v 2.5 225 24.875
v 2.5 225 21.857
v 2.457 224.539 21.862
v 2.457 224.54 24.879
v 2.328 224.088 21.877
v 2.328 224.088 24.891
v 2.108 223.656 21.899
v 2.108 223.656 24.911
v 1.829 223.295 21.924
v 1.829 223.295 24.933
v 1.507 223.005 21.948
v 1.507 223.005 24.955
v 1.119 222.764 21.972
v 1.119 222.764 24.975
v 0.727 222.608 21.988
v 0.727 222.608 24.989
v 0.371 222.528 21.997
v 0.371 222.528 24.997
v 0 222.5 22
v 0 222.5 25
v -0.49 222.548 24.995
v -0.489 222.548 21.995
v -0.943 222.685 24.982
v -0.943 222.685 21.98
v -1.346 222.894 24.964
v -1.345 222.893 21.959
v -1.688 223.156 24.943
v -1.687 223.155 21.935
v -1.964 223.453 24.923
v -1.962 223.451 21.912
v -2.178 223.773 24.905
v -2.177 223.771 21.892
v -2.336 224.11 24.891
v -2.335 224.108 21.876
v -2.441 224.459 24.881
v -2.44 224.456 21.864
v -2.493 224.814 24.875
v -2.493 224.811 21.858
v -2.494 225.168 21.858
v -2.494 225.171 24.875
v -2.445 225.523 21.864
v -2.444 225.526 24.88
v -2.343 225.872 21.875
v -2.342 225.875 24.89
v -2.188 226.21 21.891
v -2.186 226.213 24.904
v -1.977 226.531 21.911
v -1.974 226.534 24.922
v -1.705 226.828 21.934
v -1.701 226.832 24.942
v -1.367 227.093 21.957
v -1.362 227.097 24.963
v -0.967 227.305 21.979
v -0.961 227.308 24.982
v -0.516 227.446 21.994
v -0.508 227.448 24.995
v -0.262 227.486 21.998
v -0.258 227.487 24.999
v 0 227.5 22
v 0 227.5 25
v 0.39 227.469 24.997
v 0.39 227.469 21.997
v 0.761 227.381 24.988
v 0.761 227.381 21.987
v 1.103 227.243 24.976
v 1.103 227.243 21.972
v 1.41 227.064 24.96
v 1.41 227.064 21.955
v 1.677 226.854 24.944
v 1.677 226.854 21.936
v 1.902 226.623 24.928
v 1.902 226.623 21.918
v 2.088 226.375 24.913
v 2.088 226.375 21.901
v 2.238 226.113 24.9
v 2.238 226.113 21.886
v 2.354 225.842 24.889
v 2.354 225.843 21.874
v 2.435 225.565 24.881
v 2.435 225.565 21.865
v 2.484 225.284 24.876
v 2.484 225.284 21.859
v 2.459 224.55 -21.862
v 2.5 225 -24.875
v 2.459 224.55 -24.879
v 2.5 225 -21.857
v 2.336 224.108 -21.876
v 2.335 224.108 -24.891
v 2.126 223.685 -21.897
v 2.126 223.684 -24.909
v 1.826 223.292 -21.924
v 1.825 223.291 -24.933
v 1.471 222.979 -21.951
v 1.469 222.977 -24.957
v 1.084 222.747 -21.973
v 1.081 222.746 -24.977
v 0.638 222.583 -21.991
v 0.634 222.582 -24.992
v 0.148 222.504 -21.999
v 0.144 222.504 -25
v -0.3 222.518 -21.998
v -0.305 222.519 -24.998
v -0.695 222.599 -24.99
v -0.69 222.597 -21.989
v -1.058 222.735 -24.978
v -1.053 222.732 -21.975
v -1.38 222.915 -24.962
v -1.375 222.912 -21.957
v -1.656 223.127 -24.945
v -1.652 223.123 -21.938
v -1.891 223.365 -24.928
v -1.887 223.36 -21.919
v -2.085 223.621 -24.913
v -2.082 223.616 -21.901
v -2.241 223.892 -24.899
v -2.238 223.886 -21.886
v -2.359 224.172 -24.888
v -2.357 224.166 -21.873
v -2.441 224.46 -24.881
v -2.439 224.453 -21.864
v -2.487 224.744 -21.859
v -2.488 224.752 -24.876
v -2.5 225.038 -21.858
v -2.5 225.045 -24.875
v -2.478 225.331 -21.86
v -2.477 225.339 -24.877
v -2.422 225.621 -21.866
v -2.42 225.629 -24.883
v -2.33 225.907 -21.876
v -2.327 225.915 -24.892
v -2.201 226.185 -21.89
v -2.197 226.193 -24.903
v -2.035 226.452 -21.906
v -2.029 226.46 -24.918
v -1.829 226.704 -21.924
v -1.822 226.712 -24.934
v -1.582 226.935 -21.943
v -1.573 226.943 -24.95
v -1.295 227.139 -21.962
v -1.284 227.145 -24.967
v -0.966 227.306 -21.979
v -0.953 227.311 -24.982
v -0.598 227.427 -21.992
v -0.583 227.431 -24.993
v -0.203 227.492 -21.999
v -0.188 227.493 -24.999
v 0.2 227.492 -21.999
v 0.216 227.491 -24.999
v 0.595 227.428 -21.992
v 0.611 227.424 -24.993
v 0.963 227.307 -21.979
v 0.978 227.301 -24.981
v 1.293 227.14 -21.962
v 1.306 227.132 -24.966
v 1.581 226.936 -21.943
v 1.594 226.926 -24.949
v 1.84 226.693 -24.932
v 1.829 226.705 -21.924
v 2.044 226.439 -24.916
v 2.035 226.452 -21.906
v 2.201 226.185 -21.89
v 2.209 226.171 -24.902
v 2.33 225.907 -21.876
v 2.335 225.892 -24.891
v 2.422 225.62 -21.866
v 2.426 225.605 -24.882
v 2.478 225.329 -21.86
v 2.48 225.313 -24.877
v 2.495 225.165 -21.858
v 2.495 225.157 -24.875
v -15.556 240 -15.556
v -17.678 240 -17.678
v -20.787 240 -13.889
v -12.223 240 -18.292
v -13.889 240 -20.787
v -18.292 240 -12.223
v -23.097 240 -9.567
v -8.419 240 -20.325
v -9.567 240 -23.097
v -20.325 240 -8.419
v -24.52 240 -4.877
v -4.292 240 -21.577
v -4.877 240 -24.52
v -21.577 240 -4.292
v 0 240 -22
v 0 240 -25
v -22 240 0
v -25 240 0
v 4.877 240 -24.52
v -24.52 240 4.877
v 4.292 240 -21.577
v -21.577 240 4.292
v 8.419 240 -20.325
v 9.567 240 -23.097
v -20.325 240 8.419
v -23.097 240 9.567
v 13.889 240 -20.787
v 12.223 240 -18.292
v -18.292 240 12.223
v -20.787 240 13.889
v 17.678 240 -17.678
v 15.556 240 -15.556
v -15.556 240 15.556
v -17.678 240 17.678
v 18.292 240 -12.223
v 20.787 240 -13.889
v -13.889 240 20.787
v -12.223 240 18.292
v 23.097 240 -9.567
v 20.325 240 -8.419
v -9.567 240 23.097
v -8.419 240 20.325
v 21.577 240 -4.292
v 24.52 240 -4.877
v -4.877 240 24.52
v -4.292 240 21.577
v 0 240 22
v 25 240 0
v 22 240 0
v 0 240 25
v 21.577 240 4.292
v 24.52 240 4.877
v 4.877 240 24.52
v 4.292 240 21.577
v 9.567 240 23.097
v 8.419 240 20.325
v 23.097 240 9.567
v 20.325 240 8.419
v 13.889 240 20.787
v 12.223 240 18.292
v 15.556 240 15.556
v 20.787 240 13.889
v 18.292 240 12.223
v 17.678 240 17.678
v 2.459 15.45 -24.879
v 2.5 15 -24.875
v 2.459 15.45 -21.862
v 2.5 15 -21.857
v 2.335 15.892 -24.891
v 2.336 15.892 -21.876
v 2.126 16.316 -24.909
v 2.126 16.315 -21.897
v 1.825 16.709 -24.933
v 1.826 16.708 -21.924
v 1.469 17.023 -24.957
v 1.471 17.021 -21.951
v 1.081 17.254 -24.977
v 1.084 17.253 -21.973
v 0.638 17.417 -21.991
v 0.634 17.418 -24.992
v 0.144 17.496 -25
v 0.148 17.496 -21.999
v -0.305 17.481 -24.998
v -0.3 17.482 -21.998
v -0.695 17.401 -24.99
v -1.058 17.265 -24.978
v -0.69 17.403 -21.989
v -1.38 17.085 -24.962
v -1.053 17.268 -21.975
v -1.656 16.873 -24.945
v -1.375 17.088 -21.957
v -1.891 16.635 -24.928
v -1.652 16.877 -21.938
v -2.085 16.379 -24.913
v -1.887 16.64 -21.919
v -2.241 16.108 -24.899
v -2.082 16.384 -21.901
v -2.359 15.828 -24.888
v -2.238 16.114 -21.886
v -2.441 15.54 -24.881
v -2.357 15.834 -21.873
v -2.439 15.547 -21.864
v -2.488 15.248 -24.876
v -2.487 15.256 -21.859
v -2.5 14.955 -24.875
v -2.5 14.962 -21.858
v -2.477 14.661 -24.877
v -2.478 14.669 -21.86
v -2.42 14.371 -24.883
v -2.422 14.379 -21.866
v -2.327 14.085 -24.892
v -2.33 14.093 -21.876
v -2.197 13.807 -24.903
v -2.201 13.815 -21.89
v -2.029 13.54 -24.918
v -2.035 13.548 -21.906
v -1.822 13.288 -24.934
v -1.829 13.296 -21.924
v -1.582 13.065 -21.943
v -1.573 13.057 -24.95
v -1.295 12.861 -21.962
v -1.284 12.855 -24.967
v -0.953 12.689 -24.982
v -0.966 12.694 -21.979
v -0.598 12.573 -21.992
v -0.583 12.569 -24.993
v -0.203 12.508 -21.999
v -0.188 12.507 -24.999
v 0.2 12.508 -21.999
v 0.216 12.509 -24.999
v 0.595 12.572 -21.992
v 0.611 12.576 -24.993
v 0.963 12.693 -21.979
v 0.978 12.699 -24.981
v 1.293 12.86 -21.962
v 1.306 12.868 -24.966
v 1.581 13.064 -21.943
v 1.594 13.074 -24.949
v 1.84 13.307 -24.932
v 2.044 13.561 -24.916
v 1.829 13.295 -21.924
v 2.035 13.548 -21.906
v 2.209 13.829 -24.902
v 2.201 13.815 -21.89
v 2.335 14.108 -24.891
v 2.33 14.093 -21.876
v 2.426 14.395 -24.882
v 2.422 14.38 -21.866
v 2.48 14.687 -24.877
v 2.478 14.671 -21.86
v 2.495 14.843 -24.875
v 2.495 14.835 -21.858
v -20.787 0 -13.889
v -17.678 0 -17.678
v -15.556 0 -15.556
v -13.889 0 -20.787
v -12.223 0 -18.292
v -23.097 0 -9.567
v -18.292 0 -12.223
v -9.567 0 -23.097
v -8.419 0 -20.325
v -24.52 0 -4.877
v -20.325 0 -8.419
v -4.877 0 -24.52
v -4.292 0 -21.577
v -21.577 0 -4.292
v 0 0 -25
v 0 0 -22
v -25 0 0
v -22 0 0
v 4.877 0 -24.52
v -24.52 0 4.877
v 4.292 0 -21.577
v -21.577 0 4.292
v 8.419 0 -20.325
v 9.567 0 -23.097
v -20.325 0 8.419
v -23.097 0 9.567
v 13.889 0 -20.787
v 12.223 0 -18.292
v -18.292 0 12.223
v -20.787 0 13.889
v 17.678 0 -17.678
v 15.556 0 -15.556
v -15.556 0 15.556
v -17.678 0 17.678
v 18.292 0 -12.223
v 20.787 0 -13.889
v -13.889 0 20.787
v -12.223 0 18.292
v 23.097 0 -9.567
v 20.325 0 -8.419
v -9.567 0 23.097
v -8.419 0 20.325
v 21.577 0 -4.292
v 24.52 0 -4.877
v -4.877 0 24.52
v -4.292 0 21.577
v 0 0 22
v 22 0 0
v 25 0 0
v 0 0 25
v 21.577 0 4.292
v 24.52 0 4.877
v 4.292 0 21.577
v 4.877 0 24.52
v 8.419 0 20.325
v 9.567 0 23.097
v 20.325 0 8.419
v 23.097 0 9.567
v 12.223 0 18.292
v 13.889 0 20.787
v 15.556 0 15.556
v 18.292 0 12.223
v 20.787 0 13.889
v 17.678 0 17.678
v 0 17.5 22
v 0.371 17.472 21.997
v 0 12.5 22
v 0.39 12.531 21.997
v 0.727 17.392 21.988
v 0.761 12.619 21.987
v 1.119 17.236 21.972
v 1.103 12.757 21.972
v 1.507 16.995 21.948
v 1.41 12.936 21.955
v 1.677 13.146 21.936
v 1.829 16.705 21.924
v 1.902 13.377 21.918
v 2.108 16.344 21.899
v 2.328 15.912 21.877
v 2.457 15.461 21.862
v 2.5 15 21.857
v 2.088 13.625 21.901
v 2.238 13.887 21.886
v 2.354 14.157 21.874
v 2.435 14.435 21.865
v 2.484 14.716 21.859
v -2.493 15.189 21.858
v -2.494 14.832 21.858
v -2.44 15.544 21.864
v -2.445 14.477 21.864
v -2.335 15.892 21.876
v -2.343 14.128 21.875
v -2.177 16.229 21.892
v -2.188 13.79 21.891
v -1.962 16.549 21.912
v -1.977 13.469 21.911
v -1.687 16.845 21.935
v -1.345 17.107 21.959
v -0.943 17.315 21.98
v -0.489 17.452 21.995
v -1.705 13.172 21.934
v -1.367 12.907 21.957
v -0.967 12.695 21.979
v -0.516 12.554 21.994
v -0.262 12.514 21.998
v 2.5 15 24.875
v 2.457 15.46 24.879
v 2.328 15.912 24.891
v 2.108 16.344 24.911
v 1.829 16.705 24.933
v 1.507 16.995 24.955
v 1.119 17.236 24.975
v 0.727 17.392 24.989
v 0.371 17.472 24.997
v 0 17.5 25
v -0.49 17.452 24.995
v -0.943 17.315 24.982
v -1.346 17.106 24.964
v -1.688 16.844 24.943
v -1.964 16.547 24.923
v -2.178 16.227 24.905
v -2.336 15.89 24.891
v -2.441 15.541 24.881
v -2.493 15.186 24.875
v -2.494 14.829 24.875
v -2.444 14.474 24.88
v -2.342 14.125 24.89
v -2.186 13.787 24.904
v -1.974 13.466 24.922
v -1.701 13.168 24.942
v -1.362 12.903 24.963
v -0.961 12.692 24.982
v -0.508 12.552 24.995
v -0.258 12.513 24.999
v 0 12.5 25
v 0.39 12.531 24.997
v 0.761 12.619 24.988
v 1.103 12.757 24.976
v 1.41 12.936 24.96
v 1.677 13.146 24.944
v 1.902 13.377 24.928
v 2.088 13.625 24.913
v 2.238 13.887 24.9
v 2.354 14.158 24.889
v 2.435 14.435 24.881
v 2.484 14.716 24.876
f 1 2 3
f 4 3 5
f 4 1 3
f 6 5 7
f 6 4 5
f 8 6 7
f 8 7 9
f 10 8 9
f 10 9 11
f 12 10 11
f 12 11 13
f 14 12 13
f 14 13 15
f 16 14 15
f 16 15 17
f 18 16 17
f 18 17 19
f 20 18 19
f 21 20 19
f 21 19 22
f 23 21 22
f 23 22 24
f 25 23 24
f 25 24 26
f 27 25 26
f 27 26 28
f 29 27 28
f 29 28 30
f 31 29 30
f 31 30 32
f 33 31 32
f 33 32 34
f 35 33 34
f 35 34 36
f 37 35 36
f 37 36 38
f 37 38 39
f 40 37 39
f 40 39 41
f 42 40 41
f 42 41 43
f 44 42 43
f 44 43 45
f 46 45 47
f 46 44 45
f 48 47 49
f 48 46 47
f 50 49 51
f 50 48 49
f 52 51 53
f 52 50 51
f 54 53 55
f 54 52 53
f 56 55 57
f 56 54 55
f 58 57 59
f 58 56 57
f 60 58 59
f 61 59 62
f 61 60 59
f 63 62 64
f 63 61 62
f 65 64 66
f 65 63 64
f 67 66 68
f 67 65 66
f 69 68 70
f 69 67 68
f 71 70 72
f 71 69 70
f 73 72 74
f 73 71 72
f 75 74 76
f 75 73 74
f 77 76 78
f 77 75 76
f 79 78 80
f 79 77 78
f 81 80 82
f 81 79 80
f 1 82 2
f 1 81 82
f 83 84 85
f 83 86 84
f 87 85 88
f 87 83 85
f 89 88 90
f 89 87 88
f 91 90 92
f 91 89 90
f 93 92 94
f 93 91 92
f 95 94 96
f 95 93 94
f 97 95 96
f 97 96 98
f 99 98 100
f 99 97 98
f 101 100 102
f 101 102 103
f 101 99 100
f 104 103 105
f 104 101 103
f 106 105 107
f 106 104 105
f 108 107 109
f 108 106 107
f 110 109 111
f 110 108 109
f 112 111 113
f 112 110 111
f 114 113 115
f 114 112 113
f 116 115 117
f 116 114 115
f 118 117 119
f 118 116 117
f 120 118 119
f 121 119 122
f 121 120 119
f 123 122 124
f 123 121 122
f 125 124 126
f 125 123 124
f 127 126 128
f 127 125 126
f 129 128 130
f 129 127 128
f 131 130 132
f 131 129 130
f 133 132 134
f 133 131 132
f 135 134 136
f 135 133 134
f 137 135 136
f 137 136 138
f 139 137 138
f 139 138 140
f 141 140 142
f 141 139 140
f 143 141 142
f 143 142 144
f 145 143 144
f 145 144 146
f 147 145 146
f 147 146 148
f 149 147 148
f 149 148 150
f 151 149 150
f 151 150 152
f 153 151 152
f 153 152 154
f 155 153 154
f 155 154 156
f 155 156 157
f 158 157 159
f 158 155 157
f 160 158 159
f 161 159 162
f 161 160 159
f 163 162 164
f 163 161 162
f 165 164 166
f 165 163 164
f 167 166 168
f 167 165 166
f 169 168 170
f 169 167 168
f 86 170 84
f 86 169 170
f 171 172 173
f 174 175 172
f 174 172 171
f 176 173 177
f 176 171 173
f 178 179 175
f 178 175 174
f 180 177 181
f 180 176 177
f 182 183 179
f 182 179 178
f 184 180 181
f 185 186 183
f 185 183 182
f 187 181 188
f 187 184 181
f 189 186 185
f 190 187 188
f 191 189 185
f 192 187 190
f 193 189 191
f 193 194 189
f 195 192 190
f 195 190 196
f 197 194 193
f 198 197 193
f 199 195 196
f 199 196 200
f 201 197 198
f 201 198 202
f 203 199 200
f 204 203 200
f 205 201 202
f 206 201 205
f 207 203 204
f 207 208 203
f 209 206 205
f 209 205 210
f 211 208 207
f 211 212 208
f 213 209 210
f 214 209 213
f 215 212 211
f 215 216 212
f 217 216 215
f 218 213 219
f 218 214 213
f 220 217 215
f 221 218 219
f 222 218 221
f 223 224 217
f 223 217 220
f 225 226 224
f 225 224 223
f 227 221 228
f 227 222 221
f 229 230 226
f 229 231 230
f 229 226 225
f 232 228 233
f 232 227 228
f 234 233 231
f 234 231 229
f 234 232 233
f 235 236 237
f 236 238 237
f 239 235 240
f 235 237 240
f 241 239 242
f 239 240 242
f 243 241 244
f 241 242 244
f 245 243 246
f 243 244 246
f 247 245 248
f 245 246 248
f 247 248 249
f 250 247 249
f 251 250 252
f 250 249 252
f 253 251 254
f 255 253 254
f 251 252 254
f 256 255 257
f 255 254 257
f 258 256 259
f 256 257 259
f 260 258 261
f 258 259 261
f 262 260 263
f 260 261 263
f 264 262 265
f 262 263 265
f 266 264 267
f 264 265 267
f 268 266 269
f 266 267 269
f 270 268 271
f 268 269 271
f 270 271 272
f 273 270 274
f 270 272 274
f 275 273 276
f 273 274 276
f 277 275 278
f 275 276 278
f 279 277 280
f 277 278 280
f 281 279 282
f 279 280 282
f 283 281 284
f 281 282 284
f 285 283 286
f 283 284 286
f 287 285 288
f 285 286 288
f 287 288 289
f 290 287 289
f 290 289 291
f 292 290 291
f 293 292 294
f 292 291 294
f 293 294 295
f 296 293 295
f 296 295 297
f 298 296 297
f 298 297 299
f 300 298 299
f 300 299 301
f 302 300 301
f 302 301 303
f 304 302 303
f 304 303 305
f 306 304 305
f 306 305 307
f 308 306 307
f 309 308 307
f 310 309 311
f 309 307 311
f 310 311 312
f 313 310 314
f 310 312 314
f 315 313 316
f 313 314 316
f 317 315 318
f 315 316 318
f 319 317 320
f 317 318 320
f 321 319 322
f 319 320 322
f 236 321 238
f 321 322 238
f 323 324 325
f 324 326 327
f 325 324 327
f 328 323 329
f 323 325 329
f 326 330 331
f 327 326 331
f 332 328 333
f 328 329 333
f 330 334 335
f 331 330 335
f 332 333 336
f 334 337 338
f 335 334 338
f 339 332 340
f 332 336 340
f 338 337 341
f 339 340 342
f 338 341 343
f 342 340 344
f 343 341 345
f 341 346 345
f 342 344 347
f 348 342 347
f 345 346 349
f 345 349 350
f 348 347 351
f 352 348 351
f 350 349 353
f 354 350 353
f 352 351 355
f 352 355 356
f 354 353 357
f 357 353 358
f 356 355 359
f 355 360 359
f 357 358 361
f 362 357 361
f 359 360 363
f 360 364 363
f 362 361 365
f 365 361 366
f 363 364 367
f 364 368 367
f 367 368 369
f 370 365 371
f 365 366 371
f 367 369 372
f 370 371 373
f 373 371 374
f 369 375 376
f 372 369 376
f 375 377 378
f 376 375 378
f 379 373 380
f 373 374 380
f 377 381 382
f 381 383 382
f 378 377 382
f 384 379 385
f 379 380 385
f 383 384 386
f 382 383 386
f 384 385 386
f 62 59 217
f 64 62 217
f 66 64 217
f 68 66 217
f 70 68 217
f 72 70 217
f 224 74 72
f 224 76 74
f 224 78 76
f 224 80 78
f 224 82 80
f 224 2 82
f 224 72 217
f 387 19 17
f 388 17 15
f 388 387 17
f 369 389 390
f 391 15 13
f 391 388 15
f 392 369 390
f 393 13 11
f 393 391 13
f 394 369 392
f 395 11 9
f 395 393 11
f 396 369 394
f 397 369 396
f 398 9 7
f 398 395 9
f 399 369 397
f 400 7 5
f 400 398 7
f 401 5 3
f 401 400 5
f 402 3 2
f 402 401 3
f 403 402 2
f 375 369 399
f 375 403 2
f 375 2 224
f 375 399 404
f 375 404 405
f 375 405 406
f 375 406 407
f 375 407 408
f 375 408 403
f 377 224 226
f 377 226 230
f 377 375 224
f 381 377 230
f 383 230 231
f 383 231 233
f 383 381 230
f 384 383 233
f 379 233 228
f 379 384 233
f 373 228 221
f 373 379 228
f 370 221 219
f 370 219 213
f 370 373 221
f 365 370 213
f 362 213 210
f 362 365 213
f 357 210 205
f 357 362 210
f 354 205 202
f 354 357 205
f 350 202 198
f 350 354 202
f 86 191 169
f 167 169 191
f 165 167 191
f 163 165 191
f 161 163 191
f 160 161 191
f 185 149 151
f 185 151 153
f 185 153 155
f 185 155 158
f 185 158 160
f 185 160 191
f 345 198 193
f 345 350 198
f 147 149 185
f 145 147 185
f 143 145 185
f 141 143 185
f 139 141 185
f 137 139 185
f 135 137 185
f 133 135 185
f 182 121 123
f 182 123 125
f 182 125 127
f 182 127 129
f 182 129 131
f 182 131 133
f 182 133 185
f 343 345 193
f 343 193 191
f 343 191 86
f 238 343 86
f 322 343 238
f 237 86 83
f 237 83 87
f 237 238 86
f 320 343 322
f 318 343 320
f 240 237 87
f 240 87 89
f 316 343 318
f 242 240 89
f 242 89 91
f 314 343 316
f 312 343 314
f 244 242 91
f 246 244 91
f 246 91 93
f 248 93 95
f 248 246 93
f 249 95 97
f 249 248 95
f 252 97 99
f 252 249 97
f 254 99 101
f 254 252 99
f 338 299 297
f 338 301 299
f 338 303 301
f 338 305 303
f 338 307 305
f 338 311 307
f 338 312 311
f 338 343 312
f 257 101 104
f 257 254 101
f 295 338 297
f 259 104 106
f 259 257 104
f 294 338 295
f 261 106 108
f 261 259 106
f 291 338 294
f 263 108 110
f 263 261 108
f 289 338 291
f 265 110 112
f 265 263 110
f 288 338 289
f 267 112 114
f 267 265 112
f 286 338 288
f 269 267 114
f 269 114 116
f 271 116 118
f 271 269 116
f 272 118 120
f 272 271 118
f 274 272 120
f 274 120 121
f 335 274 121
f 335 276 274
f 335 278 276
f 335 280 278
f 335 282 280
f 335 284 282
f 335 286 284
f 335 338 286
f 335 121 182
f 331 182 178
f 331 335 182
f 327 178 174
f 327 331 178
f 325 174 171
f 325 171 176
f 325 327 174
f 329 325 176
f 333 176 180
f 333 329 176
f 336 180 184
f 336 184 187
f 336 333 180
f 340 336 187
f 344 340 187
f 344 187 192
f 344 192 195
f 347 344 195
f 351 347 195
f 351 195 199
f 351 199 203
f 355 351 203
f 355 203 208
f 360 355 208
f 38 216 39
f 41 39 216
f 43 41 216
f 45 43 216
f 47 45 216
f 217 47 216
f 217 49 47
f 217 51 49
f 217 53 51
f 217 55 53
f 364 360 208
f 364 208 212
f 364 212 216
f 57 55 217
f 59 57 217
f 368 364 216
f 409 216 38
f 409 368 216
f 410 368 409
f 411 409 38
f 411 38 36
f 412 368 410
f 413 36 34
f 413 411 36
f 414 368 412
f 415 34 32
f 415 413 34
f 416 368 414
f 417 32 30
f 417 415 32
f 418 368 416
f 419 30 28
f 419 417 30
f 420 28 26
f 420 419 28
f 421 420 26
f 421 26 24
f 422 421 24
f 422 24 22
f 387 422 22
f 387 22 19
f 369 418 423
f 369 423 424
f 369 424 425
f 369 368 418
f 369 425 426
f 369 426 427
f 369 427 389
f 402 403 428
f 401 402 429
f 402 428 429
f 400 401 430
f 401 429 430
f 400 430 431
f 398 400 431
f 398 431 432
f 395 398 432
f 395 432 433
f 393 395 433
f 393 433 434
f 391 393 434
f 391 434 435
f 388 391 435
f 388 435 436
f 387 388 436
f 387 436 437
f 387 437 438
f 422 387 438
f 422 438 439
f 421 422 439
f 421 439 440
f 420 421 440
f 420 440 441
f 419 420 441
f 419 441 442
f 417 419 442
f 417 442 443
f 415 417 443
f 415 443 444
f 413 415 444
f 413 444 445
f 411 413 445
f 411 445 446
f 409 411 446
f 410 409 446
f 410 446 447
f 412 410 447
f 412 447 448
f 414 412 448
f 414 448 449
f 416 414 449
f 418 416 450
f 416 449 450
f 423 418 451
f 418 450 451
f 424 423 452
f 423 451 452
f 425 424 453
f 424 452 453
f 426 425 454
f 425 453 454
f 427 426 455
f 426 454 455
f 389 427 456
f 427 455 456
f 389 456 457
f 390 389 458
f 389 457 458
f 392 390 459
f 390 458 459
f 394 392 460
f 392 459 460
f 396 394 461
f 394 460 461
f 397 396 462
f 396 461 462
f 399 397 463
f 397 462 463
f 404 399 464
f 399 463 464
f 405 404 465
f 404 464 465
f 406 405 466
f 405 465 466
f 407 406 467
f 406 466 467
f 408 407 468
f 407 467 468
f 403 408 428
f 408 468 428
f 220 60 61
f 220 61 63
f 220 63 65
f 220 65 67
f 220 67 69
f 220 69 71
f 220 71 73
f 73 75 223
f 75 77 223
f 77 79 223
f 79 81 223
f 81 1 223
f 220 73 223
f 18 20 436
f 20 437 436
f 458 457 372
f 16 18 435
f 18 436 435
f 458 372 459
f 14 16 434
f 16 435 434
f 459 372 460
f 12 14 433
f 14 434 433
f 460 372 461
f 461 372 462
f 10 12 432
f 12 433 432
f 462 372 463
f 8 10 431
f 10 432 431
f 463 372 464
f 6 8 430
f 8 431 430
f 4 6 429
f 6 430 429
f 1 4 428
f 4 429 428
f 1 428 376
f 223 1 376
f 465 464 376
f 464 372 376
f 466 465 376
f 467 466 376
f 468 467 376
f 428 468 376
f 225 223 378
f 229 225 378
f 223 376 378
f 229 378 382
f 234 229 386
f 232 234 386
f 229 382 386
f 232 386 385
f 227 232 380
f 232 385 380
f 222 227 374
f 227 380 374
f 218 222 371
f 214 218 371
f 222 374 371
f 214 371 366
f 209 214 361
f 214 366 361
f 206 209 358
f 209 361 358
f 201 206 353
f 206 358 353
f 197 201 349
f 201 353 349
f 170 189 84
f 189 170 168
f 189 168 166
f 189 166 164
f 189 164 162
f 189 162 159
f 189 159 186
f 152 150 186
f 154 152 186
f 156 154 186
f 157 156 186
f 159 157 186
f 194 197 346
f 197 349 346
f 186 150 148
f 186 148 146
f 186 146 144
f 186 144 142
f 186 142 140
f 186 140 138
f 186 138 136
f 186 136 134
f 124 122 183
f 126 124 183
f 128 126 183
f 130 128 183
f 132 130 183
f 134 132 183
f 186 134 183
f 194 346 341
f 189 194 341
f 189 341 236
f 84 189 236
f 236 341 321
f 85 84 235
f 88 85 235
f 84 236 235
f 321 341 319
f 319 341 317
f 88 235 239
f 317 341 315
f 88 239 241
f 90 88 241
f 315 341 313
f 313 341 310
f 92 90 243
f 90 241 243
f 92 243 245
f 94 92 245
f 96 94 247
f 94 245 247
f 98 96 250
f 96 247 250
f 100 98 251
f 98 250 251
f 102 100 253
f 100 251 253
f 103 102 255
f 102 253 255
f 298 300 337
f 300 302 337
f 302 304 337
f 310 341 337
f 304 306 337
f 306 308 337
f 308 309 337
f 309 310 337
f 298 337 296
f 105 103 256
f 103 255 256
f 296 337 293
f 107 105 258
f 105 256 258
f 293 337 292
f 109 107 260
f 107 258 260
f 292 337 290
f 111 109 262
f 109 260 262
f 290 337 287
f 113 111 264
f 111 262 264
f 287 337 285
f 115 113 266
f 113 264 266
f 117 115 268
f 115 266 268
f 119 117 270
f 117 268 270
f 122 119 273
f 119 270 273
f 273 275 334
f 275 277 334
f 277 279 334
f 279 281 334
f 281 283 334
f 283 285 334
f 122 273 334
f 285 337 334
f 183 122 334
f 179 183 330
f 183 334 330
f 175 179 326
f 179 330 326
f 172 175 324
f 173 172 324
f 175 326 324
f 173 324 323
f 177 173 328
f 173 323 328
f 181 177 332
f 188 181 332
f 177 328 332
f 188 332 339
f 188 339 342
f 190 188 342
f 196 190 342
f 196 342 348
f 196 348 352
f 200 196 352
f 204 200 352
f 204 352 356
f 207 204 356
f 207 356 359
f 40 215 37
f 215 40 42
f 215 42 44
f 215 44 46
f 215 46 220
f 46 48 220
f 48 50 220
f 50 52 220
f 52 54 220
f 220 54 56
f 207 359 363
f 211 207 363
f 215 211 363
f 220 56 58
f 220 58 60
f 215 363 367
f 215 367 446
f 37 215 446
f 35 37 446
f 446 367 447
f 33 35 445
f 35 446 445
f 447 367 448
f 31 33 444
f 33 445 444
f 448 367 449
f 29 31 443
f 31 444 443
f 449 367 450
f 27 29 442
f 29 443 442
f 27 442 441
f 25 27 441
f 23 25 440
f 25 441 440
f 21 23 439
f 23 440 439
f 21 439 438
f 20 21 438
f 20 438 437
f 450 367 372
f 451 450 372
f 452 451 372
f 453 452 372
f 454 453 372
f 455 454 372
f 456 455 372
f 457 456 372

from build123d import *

# Parameters (mm, degrees)
ESBO_O1_R                = 25
ESBO_O1_R_2              = 22
RESSALTO_EXTRUS_O1_DEPTH = 240
ESBO_O2_R                = 2.5
CORTE_EXTRUS_O1_DEPTH    = 243.590189414


with BuildPart() as part:
    # Esboço1 → Ressalto-extrusão1 (new body)
    with BuildSketch(Plane(origin=(0, 0, 0), x_dir=(1, 0, 0), z_dir=(0, 1, 0))):
        with Locations(Location((0, 0, 0), (0, 0, 270))):
            Circle(ESBO_O1_R)
        with Locations(Location((0, 0, 0), (0, 0, 270))):
            Circle(ESBO_O1_R_2, mode=Mode.SUBTRACT)
    extrude(amount=RESSALTO_EXTRUS_O1_DEPTH)

    # Esboço2 → Corte-extrusão1 (cut, symmetric)
    with BuildSketch(Plane.XY):
        with Locations((0, 15)):
            Circle(ESBO_O2_R)
    corte_extrus_o1 = extrude(amount=CORTE_EXTRUS_O1_DEPTH, both=True, mode=Mode.SUBTRACT)

    # Espelhar1: Corte-extrusão1 across plane
    add(corte_extrus_o1.mirror(Plane(origin=(0, 120, 0), x_dir=(0, 0, 1), z_dir=(0, -1, 0))), mode=Mode.SUBTRACT)


solid = part.part
